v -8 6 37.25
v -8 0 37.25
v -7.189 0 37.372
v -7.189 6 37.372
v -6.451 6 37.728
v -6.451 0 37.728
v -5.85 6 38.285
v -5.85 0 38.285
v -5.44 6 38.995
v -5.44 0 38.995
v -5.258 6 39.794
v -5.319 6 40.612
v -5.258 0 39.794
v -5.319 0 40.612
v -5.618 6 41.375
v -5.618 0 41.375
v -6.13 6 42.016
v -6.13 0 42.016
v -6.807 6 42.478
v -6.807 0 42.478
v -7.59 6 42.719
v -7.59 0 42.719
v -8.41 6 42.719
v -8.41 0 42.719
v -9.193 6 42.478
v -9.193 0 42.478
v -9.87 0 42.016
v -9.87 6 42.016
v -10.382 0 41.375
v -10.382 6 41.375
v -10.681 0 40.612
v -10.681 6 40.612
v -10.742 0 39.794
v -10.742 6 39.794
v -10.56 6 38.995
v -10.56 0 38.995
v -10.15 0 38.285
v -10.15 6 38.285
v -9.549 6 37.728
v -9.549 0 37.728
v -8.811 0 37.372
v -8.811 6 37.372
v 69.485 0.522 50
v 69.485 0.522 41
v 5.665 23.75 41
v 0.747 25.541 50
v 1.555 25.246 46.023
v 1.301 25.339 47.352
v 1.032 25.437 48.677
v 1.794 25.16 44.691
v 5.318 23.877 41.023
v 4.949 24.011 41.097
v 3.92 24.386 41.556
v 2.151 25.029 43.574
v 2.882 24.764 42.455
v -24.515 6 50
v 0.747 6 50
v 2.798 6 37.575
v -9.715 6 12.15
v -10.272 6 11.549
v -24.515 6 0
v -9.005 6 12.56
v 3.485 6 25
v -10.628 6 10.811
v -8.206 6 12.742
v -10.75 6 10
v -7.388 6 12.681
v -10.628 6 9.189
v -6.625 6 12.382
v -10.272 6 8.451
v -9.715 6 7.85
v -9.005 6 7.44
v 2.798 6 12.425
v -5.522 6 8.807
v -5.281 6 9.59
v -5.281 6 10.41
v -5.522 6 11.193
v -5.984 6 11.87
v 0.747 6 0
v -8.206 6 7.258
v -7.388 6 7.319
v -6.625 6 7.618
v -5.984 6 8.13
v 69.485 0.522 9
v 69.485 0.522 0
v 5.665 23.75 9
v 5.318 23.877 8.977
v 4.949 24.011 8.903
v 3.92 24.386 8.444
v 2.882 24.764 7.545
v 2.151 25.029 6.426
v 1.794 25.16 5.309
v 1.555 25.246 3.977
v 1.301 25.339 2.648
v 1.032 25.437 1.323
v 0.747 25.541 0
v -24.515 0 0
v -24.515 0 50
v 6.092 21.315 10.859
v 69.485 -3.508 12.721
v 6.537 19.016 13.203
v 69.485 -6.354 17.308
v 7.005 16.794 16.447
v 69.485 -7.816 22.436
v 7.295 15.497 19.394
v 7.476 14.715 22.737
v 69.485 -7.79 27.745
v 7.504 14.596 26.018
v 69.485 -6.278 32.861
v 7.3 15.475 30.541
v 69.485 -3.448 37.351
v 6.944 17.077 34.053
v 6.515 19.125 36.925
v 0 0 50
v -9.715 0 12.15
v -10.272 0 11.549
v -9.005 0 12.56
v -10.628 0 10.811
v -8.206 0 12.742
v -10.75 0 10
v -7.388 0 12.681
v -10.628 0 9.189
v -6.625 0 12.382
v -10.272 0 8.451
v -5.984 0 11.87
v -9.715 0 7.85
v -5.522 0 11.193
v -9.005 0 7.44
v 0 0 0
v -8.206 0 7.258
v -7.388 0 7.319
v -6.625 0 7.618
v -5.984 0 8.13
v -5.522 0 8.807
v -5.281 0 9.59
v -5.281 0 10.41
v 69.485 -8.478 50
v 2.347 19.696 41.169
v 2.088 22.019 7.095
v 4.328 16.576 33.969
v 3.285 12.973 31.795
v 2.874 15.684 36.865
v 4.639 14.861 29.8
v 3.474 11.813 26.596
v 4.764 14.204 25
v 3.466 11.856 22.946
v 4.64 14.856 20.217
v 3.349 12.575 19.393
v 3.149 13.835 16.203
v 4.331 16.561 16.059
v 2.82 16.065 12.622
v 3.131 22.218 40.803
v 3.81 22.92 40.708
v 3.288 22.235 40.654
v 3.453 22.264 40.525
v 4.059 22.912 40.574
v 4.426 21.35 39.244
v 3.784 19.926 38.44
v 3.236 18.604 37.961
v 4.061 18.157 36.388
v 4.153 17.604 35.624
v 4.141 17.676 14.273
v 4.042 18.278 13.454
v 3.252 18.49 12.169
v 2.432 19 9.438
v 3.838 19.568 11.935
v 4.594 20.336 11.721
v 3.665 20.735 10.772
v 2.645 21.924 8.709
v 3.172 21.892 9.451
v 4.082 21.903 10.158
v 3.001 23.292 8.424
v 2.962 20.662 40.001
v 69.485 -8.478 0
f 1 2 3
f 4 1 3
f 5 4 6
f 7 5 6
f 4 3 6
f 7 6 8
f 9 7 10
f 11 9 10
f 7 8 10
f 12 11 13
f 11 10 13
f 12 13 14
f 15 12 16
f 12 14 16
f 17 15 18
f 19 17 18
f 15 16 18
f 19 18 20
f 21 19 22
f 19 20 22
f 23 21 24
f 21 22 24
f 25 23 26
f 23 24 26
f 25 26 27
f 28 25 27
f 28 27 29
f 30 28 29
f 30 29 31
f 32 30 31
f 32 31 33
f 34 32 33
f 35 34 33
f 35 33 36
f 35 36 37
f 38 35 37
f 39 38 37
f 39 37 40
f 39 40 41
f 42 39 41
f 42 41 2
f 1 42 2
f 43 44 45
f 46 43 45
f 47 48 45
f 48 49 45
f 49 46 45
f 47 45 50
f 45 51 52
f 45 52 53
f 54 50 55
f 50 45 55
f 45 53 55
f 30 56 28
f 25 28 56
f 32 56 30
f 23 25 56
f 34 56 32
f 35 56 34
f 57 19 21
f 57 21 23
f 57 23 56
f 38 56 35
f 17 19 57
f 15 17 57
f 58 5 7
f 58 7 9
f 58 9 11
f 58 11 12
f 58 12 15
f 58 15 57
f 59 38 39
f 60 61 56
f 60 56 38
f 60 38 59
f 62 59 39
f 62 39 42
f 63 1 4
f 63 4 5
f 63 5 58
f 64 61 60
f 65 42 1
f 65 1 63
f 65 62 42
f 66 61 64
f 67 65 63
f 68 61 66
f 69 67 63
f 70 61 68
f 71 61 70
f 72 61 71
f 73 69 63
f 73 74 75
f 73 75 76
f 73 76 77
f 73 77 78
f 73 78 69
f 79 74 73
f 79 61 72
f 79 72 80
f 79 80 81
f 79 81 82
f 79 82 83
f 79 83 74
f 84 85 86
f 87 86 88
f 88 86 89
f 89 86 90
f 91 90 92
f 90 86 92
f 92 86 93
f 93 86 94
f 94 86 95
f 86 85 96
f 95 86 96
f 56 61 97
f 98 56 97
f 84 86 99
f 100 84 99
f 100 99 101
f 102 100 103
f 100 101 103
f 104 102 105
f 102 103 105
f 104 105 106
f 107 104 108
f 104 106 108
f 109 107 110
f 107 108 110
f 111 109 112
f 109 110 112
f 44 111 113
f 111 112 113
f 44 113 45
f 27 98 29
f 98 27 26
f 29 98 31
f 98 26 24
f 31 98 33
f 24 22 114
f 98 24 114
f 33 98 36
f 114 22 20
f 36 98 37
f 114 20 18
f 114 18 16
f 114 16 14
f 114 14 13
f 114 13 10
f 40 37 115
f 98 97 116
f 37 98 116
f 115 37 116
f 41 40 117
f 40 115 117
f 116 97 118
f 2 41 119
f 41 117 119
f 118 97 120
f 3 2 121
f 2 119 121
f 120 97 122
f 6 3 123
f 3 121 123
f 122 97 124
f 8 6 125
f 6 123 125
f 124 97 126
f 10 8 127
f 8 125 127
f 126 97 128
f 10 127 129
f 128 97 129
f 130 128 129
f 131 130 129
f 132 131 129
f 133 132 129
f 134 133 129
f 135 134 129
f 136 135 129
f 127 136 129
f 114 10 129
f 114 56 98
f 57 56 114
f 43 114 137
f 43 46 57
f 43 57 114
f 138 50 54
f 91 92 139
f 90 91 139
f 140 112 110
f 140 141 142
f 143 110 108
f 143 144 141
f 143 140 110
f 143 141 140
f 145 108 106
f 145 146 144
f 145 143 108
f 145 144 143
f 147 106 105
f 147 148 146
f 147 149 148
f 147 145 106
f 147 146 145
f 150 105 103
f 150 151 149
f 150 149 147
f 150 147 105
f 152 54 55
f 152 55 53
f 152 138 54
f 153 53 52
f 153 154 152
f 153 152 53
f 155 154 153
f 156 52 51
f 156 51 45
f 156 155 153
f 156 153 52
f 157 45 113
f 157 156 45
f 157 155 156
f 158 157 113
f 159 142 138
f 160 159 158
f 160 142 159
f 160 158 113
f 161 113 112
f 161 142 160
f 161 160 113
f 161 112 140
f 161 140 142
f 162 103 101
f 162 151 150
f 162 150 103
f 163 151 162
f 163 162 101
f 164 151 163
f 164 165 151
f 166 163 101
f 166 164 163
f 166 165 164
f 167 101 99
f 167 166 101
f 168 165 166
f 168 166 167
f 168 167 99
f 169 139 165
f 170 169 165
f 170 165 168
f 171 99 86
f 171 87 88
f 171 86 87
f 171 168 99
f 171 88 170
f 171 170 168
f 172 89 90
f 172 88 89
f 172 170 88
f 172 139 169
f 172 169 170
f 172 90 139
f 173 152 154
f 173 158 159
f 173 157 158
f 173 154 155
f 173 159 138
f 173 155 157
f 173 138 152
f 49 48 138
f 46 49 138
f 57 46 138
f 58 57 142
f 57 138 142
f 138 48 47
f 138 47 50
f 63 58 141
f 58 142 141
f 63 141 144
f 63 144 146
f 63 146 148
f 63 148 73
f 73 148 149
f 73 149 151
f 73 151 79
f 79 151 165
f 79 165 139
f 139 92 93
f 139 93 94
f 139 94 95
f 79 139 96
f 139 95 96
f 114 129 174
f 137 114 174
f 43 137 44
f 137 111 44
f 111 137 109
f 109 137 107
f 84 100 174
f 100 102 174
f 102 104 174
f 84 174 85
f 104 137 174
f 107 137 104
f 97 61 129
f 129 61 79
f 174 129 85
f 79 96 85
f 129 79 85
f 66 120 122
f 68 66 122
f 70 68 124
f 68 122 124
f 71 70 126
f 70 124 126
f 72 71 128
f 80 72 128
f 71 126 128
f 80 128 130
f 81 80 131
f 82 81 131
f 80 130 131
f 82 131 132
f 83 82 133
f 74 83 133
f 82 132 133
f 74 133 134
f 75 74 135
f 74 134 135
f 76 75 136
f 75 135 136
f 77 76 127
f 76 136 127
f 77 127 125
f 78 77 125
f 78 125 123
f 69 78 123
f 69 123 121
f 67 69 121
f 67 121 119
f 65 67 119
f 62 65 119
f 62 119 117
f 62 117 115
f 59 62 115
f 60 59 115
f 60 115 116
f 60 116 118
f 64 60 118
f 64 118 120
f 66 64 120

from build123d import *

# Parameters (mm, degrees)
EXTRUDE_1_DEPTH     = 50
SKETCH_4_R          = 20
CUT_EXTRUDE_1_DEPTH = 96.654466254
SKETCH_6_R          = 115.5
CUT_EXTRUDE_3_DEPTH = 20
SKETCH_8_R          = 2.75
CUT_EXTRUDE_4_DEPTH = 10
FILLET_1_R          = 3


with BuildPart() as part:
    # 草图1 → 凸台-拉伸1 (new body)
    with BuildSketch(Plane.XY):
        Polygon((-24.51528993, 0), (0, 0), (69.48471007, -8.477916399), (69.48471007, 0.522083601), (-0.51528993, 26), (-24.51528993, 26), align=None)
    extrude(amount=EXTRUDE_1_DEPTH)

    # 草图4 → 切除-拉伸1 (cut, through all)
    with BuildSketch(Plane(origin=(-8.811251384, 3.207033231, 0), x_dir=(0, 0, 1), z_dir=(-0.9396926207859082, 0.34202014332566955, 0))):
        with Locations((25, 36.255768605)):
            Circle(SKETCH_4_R)
    extrude(amount=-CUT_EXTRUDE_1_DEPTH, mode=Mode.SUBTRACT)

    # 草图6 → 切除-拉伸3 (cut)
    with BuildSketch(Plane(origin=(0, 26, 0), x_dir=(1, 0, 0), z_dir=(0, 1, 0))):
        with Locations((-112.01528993, -25)):
            Circle(SKETCH_6_R)
    extrude(amount=-CUT_EXTRUDE_3_DEPTH, mode=Mode.SUBTRACT)

    # 草图8 → 切除-拉伸4 (cut)
    with BuildSketch(Plane.XZ):
        with Locations((-8, 40)):
            Circle(SKETCH_8_R)
        with Locations((-8, 10)):
            Circle(SKETCH_8_R)
    extrude(amount=-CUT_EXTRUDE_4_DEPTH, mode=Mode.SUBTRACT)

    # 圆角1
    fillet_1_edges = [part.edges().sort_by_distance(p)[0] for p in [
        (3.48471007, 16.030696883, 25),
    ]]
    fillet(fillet_1_edges, radius=FILLET_1_R)


solid = part.part
